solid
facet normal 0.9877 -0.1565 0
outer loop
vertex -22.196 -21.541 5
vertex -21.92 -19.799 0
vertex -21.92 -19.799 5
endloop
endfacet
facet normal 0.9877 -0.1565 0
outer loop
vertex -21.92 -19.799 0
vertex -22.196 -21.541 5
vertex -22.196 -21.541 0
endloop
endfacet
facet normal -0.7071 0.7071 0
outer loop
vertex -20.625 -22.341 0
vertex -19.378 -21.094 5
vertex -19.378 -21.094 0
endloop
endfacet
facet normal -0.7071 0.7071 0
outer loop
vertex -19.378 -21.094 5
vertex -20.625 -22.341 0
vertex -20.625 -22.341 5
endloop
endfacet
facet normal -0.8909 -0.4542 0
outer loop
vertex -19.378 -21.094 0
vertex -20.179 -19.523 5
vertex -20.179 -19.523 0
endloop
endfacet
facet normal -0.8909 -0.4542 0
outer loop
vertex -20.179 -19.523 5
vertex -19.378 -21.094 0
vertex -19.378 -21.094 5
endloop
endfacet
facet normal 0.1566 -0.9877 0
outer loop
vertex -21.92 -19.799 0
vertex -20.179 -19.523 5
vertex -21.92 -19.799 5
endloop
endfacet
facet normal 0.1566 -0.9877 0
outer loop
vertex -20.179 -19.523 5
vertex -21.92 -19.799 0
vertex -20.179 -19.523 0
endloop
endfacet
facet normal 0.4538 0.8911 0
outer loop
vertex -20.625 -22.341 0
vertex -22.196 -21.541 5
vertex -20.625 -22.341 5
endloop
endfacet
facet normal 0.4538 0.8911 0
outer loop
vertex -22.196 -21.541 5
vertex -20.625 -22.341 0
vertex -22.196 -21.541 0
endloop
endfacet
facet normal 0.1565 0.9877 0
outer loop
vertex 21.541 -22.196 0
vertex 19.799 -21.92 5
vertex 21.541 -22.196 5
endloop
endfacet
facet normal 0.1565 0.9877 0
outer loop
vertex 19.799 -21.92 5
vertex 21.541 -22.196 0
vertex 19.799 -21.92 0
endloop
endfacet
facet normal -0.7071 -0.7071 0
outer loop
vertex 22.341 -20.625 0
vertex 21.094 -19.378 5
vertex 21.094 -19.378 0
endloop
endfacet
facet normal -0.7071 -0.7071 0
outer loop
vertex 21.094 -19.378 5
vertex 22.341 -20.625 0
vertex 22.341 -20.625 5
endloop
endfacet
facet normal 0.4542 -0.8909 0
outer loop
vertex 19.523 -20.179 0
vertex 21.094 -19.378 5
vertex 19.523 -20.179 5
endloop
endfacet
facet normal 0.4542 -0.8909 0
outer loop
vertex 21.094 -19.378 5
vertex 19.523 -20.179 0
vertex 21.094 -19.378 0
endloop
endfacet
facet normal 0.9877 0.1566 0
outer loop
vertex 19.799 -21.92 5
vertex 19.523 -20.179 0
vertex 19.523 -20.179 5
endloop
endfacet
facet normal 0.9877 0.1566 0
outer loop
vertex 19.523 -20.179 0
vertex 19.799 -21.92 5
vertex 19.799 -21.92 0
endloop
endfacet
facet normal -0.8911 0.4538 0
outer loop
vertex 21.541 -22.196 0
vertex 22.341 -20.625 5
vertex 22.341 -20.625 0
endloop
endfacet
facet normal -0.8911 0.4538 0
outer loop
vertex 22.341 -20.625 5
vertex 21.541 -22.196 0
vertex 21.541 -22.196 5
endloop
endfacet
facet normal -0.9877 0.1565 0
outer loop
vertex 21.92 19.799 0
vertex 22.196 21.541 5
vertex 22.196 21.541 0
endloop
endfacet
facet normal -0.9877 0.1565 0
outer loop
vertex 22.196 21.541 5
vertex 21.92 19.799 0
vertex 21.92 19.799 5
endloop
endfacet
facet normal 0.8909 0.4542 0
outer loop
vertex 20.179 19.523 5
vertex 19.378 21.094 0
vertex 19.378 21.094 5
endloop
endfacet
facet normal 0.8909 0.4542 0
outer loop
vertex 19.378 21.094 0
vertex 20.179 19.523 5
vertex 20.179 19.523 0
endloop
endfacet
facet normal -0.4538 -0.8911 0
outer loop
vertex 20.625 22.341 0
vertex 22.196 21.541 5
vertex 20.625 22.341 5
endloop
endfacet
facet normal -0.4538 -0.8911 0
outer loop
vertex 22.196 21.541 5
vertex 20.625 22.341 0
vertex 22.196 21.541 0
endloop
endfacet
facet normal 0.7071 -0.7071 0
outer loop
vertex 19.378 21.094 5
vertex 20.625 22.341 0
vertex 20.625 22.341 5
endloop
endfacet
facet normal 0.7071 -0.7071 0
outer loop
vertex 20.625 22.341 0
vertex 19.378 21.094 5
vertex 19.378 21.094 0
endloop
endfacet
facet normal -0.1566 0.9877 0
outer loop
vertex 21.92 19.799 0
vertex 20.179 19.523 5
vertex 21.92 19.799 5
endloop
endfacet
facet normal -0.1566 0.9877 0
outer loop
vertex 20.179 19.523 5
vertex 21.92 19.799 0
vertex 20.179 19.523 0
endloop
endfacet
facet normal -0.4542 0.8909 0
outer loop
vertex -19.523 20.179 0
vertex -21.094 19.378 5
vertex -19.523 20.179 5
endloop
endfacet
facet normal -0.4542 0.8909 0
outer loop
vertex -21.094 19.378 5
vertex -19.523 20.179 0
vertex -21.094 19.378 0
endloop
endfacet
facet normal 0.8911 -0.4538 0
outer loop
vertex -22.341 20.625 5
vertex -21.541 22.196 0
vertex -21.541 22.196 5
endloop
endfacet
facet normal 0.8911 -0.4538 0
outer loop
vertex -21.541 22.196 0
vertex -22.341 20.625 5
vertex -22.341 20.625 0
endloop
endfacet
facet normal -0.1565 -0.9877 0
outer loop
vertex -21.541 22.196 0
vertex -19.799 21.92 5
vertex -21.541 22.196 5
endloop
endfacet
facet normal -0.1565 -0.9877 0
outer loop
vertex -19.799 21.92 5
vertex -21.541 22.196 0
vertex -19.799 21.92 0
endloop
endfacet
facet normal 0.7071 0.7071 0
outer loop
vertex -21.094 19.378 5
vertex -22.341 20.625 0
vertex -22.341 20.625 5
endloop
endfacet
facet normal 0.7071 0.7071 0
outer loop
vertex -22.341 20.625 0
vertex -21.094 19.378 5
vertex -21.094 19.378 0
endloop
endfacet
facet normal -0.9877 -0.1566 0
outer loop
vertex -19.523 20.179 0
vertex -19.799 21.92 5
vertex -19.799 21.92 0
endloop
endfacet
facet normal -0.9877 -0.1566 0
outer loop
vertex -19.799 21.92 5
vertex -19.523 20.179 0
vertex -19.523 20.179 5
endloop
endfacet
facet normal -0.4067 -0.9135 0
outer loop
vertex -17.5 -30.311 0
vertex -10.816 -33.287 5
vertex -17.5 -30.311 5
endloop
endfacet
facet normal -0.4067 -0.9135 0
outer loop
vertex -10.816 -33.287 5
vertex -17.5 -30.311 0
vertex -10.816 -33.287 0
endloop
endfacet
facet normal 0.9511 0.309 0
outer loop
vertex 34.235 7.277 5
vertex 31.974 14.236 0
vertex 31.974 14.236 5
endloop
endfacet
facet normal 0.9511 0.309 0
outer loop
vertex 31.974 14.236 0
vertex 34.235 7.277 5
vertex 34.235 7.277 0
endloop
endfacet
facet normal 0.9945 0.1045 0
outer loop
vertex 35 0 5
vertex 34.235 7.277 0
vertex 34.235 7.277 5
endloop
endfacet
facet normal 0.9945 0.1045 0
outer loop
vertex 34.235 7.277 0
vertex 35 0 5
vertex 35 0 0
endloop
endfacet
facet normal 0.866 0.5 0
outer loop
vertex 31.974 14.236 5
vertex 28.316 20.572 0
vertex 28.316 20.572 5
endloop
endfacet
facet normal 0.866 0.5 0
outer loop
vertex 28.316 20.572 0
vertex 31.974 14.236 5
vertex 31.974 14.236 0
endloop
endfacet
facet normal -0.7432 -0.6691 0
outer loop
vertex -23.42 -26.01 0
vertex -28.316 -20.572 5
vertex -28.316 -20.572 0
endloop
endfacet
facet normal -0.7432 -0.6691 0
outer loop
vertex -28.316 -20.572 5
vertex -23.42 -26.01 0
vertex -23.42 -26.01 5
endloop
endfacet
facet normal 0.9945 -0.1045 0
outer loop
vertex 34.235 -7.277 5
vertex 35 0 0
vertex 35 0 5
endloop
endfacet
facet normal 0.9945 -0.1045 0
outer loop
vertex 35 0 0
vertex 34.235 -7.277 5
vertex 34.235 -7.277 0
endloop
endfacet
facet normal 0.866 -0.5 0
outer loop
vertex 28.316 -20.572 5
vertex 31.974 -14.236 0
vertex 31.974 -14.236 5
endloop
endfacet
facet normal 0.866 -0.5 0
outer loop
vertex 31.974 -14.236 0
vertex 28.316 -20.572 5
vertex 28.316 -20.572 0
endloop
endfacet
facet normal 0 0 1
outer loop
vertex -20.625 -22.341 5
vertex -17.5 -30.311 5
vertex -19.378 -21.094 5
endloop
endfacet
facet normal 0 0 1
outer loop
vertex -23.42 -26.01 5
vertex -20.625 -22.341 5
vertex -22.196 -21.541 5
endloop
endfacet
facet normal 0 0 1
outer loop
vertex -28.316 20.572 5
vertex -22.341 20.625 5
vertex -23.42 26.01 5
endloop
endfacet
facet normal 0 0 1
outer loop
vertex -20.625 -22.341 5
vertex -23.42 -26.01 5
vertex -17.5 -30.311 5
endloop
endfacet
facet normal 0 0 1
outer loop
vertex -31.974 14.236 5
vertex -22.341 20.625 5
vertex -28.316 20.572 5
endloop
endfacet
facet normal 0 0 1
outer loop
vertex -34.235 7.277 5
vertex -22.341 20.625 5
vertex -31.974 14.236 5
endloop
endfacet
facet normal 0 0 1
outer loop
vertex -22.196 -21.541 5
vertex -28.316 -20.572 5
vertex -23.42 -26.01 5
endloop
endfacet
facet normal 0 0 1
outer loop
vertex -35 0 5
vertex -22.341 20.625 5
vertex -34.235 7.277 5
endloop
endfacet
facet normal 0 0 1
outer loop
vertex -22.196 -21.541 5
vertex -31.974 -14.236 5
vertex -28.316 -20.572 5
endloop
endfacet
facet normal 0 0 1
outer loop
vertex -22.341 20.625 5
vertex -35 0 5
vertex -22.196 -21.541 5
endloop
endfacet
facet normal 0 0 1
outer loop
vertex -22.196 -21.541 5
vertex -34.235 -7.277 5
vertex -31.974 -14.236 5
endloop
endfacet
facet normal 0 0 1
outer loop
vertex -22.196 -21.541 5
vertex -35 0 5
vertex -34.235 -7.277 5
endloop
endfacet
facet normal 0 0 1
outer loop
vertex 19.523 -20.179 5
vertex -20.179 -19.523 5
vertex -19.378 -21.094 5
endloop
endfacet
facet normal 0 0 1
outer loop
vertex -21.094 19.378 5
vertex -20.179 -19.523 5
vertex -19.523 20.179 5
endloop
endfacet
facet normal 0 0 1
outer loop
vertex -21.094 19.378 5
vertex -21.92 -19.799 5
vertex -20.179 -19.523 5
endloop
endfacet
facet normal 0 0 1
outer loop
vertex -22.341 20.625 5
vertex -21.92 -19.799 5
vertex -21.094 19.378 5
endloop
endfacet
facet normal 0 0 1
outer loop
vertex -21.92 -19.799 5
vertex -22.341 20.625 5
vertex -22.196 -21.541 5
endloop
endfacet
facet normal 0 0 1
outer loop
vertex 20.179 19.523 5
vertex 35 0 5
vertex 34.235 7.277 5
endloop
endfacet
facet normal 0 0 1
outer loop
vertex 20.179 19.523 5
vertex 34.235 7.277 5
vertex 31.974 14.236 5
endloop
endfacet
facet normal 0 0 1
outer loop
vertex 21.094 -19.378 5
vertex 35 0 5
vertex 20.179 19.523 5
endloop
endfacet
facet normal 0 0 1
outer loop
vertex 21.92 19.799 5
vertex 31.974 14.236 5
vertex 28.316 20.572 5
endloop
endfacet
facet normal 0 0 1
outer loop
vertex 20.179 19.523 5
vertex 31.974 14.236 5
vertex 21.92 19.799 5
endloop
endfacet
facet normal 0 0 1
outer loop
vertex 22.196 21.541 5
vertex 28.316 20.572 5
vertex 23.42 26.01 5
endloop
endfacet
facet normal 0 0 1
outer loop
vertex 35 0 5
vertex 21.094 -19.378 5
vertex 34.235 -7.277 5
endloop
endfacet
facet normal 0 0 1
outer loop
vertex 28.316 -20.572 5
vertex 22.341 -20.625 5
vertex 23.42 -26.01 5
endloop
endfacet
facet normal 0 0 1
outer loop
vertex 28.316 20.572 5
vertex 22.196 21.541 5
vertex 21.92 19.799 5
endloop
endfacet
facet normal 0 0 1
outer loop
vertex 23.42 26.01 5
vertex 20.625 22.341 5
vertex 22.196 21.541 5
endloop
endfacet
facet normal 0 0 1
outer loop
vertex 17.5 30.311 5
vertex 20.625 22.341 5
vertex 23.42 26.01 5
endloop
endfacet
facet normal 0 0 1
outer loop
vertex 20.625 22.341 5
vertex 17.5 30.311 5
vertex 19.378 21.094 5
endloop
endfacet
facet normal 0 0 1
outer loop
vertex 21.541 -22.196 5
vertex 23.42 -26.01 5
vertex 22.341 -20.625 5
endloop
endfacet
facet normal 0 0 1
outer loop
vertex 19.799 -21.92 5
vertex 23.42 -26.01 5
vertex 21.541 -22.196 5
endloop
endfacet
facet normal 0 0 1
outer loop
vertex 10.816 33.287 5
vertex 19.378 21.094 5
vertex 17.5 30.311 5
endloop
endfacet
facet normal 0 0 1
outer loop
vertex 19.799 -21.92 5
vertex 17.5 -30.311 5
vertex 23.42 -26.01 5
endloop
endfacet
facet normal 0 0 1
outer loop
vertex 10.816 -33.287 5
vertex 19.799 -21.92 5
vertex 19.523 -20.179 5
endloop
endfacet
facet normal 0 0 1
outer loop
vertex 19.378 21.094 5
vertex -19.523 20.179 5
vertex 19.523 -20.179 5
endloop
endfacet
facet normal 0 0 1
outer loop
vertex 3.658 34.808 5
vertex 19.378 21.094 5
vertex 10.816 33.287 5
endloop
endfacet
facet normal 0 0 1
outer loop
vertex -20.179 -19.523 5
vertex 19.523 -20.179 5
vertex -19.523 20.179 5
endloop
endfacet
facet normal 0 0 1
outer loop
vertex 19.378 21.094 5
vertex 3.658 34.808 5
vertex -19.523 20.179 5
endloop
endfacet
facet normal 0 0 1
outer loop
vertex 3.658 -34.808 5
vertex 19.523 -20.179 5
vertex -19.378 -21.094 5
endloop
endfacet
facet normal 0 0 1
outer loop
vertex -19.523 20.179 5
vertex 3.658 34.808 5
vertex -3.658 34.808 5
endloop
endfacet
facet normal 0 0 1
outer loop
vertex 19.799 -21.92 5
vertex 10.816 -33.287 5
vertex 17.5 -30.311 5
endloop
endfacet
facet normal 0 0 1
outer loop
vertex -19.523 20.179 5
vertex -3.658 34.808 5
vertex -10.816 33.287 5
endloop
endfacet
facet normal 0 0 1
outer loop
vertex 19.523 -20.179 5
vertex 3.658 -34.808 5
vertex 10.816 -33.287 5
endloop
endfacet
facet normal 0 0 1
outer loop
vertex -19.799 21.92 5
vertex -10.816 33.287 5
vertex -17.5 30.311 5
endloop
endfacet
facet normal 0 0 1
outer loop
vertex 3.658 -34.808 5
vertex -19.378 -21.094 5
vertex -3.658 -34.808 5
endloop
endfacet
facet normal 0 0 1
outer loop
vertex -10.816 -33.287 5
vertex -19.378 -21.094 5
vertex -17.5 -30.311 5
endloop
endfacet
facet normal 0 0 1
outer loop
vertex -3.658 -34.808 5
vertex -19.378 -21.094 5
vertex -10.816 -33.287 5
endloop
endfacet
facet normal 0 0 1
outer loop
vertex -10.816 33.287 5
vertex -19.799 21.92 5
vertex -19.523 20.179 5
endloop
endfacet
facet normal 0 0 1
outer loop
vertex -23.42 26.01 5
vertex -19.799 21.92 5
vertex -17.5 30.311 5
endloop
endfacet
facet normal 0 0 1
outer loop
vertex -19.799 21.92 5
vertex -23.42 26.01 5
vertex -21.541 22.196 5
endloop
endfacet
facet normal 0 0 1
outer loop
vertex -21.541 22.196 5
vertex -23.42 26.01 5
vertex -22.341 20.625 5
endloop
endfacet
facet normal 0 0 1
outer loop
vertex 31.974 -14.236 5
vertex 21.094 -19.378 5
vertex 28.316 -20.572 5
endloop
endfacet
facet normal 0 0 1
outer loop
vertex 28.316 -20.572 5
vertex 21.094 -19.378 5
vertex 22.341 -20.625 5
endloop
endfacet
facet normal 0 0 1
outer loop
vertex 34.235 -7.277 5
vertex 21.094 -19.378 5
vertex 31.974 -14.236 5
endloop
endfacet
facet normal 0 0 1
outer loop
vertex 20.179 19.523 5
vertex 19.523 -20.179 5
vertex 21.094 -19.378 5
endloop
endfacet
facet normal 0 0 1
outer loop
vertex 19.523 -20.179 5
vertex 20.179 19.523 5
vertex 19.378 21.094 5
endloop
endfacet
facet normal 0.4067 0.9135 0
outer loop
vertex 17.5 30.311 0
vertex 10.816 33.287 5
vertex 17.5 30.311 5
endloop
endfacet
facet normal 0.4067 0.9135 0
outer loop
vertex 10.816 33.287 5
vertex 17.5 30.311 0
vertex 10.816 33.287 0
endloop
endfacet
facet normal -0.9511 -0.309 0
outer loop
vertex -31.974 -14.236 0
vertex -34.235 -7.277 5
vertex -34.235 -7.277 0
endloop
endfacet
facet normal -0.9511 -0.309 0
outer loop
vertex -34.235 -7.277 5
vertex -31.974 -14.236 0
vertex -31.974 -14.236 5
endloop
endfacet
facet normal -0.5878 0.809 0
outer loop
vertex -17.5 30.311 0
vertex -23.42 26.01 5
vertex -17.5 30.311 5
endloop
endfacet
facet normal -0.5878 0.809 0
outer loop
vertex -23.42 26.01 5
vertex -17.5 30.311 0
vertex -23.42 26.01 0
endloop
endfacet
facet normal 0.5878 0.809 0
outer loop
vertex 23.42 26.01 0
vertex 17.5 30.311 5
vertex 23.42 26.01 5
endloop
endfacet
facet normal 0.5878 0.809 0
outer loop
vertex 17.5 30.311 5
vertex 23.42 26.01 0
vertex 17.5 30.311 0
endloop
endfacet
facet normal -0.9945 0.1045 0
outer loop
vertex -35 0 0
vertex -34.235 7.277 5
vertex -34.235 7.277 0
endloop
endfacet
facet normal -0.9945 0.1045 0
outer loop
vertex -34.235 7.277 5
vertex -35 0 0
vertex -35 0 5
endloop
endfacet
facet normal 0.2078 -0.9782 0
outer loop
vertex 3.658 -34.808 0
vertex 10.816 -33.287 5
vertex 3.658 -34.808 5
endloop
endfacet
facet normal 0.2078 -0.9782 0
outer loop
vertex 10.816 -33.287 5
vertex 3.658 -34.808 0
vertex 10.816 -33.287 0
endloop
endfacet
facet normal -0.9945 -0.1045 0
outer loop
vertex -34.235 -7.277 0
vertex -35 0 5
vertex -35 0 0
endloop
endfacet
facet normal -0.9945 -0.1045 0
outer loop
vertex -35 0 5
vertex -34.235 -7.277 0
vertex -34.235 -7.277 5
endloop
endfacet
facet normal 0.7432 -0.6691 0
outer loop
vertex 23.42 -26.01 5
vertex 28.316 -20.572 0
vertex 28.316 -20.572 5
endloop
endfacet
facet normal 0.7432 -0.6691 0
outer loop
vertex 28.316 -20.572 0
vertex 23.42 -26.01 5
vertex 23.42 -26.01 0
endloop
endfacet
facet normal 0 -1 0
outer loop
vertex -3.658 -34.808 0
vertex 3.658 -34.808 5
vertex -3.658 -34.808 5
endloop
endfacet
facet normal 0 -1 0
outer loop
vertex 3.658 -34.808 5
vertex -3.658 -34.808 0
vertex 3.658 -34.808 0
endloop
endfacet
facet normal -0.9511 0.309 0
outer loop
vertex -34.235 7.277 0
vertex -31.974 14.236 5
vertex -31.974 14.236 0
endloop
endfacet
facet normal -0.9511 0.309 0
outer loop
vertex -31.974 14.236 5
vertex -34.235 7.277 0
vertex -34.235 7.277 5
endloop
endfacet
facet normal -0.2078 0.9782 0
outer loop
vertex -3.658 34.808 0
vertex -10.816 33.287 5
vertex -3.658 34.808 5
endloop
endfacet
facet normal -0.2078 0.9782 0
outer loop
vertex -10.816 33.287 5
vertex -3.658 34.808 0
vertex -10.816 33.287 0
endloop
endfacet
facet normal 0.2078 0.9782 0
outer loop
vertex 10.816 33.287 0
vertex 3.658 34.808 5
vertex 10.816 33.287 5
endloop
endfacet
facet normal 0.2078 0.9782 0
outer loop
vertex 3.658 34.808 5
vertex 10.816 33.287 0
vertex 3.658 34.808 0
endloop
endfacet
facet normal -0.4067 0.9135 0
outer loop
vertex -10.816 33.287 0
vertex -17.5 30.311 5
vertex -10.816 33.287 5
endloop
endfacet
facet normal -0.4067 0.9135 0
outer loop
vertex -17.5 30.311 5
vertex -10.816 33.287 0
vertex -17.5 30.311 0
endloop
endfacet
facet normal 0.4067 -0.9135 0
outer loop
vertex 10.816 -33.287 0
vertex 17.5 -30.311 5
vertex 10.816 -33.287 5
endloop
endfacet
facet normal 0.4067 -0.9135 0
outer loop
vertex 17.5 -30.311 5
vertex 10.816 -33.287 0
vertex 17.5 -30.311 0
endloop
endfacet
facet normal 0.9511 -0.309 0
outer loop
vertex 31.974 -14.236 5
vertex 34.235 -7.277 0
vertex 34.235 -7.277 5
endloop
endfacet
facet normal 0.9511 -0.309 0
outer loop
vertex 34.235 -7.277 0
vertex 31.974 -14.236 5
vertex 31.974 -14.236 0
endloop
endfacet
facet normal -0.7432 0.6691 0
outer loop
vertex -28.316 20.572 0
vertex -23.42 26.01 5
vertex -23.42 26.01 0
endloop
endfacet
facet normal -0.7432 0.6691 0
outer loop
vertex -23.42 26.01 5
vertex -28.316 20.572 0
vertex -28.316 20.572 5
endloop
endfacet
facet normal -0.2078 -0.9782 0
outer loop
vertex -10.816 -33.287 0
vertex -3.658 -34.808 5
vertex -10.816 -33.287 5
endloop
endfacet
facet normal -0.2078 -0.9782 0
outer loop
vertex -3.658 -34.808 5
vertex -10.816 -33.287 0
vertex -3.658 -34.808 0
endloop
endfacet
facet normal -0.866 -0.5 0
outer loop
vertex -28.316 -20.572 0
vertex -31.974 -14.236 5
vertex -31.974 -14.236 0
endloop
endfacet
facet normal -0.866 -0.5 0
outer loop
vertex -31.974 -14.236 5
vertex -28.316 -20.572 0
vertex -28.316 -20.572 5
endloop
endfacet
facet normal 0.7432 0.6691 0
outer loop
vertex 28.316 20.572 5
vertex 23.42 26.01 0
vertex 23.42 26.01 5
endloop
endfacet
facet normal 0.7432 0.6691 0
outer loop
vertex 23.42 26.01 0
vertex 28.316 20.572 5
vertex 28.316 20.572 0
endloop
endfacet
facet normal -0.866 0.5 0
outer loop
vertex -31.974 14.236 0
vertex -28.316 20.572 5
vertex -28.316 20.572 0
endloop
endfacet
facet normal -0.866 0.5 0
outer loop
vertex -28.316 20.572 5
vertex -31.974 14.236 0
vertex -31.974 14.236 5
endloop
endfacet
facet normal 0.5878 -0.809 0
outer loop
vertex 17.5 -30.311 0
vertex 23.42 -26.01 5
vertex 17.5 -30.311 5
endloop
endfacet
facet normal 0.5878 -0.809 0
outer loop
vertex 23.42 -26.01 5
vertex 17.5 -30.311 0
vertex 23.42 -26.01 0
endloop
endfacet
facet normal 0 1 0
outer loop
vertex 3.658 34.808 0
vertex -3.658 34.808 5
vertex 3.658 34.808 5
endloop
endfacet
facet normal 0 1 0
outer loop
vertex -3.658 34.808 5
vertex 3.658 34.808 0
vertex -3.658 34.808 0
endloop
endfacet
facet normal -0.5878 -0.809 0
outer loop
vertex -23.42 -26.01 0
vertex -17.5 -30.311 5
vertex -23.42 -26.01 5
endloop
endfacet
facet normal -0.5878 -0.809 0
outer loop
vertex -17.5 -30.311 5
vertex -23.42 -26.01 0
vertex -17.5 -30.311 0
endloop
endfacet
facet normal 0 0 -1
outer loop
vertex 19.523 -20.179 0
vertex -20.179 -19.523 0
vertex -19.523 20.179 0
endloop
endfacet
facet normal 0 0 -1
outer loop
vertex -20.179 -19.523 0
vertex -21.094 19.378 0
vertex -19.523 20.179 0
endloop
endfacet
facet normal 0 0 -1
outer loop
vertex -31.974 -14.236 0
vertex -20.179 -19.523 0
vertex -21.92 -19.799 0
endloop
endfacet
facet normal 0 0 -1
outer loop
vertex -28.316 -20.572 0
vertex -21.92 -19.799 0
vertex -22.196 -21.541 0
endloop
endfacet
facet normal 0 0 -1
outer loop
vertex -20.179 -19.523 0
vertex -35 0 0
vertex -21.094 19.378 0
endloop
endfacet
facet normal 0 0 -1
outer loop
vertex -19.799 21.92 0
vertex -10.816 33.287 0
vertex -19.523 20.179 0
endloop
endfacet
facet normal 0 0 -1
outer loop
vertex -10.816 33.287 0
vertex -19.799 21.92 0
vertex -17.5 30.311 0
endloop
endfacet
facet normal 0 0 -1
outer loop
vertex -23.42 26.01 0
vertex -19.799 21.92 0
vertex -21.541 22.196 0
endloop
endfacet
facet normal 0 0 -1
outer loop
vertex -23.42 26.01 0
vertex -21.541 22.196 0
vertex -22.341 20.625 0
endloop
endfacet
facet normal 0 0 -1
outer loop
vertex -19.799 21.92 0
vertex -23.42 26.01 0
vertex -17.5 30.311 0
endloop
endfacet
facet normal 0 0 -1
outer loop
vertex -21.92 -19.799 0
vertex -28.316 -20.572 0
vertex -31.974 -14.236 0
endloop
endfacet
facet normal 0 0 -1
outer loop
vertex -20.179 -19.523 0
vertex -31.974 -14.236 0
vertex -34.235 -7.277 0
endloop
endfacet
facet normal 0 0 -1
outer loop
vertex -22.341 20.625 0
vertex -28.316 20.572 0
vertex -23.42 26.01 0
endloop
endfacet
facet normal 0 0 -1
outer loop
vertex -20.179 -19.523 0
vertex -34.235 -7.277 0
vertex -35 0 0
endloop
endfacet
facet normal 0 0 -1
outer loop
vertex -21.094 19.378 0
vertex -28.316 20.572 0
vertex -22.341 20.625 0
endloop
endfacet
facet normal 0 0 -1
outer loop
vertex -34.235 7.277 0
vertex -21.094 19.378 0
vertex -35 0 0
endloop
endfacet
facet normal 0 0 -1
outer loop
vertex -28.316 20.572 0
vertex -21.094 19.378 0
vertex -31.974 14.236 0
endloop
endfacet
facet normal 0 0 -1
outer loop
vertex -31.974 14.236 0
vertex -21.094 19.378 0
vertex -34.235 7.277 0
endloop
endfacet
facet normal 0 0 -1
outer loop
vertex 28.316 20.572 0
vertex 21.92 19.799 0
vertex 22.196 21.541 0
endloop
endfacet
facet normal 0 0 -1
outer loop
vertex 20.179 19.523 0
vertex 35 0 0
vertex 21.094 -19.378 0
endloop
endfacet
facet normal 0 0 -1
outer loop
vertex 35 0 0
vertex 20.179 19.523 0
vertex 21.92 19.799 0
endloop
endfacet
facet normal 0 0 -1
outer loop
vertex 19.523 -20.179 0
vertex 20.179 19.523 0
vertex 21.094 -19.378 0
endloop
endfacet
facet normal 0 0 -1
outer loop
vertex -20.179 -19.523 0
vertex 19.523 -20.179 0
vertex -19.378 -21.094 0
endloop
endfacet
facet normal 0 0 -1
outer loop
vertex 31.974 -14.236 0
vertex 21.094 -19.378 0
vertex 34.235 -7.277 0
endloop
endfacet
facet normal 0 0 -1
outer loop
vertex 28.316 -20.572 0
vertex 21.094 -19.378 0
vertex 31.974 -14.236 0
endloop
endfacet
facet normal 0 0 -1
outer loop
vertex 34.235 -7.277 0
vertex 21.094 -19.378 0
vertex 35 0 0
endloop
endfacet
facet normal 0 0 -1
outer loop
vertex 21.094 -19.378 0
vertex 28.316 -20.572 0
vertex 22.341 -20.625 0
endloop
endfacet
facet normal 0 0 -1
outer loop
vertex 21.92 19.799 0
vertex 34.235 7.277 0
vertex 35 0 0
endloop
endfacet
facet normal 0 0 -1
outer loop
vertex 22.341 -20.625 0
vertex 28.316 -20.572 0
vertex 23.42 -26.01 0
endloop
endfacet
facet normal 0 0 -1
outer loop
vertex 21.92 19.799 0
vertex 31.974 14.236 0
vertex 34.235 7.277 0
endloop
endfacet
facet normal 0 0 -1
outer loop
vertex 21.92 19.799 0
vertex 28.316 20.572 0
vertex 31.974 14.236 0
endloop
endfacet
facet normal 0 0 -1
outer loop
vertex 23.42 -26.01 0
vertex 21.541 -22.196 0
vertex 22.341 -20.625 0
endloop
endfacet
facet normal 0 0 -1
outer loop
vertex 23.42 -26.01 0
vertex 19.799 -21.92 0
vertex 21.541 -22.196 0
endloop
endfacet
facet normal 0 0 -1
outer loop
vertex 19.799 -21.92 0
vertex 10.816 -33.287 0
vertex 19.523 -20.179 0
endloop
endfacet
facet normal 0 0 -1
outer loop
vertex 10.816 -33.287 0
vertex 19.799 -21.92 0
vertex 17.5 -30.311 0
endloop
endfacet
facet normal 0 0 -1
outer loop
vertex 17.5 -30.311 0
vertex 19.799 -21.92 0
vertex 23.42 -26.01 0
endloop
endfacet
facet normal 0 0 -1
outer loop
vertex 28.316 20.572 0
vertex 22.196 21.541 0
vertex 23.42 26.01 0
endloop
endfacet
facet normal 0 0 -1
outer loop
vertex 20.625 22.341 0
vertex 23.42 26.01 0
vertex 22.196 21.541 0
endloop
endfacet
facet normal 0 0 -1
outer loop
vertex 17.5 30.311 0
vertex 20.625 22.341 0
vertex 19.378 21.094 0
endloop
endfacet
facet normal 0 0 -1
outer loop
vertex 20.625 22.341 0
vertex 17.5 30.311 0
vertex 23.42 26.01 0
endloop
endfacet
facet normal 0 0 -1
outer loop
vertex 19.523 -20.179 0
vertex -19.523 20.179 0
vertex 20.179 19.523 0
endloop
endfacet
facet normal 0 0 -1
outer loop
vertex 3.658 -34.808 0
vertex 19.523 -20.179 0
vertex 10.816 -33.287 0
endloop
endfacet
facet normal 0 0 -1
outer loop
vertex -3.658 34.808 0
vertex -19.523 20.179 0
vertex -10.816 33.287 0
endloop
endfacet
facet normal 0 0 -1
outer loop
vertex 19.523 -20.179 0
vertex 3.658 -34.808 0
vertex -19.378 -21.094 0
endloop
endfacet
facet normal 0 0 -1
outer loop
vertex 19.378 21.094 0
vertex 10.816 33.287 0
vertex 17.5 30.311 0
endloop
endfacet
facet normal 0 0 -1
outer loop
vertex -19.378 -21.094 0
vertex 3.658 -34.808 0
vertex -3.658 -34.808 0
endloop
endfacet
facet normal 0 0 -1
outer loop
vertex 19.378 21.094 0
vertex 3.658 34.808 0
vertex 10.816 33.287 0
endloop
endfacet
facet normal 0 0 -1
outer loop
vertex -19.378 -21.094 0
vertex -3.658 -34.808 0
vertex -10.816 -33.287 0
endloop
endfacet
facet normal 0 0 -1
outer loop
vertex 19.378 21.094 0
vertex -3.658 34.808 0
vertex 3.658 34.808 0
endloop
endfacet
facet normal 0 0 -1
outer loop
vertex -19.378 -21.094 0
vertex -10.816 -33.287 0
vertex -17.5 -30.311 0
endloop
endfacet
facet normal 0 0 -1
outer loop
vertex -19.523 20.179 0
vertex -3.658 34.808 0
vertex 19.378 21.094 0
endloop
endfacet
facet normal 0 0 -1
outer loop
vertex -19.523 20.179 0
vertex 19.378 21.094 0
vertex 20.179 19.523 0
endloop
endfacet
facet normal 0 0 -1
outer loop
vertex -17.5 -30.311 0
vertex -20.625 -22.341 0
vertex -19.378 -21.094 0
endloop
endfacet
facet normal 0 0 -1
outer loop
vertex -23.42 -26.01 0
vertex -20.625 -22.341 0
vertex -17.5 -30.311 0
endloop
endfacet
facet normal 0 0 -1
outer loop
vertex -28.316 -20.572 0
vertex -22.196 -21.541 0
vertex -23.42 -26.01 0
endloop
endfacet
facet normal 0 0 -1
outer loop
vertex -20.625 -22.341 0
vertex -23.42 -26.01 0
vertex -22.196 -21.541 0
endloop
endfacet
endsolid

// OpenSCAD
//for(i=[-1,1]) rotate(90) translate([25*i/2, 50, 0])cylinder(h=20,r=1.5);
  
difference(){
    union(){
        cylinder(h=5,r=35);
        //cylinder(h=30, r1=48/2, r2=45/2);
    }
    translate([0,0, 0]) for(j=[1:4]) 
        rotate(90*j+45) translate([0,45/2+7,0]) cylinder(h=25, r=1.5, center=true);
    
    //cylinder(h=150, r=38/2+0.5, center=true);
}
